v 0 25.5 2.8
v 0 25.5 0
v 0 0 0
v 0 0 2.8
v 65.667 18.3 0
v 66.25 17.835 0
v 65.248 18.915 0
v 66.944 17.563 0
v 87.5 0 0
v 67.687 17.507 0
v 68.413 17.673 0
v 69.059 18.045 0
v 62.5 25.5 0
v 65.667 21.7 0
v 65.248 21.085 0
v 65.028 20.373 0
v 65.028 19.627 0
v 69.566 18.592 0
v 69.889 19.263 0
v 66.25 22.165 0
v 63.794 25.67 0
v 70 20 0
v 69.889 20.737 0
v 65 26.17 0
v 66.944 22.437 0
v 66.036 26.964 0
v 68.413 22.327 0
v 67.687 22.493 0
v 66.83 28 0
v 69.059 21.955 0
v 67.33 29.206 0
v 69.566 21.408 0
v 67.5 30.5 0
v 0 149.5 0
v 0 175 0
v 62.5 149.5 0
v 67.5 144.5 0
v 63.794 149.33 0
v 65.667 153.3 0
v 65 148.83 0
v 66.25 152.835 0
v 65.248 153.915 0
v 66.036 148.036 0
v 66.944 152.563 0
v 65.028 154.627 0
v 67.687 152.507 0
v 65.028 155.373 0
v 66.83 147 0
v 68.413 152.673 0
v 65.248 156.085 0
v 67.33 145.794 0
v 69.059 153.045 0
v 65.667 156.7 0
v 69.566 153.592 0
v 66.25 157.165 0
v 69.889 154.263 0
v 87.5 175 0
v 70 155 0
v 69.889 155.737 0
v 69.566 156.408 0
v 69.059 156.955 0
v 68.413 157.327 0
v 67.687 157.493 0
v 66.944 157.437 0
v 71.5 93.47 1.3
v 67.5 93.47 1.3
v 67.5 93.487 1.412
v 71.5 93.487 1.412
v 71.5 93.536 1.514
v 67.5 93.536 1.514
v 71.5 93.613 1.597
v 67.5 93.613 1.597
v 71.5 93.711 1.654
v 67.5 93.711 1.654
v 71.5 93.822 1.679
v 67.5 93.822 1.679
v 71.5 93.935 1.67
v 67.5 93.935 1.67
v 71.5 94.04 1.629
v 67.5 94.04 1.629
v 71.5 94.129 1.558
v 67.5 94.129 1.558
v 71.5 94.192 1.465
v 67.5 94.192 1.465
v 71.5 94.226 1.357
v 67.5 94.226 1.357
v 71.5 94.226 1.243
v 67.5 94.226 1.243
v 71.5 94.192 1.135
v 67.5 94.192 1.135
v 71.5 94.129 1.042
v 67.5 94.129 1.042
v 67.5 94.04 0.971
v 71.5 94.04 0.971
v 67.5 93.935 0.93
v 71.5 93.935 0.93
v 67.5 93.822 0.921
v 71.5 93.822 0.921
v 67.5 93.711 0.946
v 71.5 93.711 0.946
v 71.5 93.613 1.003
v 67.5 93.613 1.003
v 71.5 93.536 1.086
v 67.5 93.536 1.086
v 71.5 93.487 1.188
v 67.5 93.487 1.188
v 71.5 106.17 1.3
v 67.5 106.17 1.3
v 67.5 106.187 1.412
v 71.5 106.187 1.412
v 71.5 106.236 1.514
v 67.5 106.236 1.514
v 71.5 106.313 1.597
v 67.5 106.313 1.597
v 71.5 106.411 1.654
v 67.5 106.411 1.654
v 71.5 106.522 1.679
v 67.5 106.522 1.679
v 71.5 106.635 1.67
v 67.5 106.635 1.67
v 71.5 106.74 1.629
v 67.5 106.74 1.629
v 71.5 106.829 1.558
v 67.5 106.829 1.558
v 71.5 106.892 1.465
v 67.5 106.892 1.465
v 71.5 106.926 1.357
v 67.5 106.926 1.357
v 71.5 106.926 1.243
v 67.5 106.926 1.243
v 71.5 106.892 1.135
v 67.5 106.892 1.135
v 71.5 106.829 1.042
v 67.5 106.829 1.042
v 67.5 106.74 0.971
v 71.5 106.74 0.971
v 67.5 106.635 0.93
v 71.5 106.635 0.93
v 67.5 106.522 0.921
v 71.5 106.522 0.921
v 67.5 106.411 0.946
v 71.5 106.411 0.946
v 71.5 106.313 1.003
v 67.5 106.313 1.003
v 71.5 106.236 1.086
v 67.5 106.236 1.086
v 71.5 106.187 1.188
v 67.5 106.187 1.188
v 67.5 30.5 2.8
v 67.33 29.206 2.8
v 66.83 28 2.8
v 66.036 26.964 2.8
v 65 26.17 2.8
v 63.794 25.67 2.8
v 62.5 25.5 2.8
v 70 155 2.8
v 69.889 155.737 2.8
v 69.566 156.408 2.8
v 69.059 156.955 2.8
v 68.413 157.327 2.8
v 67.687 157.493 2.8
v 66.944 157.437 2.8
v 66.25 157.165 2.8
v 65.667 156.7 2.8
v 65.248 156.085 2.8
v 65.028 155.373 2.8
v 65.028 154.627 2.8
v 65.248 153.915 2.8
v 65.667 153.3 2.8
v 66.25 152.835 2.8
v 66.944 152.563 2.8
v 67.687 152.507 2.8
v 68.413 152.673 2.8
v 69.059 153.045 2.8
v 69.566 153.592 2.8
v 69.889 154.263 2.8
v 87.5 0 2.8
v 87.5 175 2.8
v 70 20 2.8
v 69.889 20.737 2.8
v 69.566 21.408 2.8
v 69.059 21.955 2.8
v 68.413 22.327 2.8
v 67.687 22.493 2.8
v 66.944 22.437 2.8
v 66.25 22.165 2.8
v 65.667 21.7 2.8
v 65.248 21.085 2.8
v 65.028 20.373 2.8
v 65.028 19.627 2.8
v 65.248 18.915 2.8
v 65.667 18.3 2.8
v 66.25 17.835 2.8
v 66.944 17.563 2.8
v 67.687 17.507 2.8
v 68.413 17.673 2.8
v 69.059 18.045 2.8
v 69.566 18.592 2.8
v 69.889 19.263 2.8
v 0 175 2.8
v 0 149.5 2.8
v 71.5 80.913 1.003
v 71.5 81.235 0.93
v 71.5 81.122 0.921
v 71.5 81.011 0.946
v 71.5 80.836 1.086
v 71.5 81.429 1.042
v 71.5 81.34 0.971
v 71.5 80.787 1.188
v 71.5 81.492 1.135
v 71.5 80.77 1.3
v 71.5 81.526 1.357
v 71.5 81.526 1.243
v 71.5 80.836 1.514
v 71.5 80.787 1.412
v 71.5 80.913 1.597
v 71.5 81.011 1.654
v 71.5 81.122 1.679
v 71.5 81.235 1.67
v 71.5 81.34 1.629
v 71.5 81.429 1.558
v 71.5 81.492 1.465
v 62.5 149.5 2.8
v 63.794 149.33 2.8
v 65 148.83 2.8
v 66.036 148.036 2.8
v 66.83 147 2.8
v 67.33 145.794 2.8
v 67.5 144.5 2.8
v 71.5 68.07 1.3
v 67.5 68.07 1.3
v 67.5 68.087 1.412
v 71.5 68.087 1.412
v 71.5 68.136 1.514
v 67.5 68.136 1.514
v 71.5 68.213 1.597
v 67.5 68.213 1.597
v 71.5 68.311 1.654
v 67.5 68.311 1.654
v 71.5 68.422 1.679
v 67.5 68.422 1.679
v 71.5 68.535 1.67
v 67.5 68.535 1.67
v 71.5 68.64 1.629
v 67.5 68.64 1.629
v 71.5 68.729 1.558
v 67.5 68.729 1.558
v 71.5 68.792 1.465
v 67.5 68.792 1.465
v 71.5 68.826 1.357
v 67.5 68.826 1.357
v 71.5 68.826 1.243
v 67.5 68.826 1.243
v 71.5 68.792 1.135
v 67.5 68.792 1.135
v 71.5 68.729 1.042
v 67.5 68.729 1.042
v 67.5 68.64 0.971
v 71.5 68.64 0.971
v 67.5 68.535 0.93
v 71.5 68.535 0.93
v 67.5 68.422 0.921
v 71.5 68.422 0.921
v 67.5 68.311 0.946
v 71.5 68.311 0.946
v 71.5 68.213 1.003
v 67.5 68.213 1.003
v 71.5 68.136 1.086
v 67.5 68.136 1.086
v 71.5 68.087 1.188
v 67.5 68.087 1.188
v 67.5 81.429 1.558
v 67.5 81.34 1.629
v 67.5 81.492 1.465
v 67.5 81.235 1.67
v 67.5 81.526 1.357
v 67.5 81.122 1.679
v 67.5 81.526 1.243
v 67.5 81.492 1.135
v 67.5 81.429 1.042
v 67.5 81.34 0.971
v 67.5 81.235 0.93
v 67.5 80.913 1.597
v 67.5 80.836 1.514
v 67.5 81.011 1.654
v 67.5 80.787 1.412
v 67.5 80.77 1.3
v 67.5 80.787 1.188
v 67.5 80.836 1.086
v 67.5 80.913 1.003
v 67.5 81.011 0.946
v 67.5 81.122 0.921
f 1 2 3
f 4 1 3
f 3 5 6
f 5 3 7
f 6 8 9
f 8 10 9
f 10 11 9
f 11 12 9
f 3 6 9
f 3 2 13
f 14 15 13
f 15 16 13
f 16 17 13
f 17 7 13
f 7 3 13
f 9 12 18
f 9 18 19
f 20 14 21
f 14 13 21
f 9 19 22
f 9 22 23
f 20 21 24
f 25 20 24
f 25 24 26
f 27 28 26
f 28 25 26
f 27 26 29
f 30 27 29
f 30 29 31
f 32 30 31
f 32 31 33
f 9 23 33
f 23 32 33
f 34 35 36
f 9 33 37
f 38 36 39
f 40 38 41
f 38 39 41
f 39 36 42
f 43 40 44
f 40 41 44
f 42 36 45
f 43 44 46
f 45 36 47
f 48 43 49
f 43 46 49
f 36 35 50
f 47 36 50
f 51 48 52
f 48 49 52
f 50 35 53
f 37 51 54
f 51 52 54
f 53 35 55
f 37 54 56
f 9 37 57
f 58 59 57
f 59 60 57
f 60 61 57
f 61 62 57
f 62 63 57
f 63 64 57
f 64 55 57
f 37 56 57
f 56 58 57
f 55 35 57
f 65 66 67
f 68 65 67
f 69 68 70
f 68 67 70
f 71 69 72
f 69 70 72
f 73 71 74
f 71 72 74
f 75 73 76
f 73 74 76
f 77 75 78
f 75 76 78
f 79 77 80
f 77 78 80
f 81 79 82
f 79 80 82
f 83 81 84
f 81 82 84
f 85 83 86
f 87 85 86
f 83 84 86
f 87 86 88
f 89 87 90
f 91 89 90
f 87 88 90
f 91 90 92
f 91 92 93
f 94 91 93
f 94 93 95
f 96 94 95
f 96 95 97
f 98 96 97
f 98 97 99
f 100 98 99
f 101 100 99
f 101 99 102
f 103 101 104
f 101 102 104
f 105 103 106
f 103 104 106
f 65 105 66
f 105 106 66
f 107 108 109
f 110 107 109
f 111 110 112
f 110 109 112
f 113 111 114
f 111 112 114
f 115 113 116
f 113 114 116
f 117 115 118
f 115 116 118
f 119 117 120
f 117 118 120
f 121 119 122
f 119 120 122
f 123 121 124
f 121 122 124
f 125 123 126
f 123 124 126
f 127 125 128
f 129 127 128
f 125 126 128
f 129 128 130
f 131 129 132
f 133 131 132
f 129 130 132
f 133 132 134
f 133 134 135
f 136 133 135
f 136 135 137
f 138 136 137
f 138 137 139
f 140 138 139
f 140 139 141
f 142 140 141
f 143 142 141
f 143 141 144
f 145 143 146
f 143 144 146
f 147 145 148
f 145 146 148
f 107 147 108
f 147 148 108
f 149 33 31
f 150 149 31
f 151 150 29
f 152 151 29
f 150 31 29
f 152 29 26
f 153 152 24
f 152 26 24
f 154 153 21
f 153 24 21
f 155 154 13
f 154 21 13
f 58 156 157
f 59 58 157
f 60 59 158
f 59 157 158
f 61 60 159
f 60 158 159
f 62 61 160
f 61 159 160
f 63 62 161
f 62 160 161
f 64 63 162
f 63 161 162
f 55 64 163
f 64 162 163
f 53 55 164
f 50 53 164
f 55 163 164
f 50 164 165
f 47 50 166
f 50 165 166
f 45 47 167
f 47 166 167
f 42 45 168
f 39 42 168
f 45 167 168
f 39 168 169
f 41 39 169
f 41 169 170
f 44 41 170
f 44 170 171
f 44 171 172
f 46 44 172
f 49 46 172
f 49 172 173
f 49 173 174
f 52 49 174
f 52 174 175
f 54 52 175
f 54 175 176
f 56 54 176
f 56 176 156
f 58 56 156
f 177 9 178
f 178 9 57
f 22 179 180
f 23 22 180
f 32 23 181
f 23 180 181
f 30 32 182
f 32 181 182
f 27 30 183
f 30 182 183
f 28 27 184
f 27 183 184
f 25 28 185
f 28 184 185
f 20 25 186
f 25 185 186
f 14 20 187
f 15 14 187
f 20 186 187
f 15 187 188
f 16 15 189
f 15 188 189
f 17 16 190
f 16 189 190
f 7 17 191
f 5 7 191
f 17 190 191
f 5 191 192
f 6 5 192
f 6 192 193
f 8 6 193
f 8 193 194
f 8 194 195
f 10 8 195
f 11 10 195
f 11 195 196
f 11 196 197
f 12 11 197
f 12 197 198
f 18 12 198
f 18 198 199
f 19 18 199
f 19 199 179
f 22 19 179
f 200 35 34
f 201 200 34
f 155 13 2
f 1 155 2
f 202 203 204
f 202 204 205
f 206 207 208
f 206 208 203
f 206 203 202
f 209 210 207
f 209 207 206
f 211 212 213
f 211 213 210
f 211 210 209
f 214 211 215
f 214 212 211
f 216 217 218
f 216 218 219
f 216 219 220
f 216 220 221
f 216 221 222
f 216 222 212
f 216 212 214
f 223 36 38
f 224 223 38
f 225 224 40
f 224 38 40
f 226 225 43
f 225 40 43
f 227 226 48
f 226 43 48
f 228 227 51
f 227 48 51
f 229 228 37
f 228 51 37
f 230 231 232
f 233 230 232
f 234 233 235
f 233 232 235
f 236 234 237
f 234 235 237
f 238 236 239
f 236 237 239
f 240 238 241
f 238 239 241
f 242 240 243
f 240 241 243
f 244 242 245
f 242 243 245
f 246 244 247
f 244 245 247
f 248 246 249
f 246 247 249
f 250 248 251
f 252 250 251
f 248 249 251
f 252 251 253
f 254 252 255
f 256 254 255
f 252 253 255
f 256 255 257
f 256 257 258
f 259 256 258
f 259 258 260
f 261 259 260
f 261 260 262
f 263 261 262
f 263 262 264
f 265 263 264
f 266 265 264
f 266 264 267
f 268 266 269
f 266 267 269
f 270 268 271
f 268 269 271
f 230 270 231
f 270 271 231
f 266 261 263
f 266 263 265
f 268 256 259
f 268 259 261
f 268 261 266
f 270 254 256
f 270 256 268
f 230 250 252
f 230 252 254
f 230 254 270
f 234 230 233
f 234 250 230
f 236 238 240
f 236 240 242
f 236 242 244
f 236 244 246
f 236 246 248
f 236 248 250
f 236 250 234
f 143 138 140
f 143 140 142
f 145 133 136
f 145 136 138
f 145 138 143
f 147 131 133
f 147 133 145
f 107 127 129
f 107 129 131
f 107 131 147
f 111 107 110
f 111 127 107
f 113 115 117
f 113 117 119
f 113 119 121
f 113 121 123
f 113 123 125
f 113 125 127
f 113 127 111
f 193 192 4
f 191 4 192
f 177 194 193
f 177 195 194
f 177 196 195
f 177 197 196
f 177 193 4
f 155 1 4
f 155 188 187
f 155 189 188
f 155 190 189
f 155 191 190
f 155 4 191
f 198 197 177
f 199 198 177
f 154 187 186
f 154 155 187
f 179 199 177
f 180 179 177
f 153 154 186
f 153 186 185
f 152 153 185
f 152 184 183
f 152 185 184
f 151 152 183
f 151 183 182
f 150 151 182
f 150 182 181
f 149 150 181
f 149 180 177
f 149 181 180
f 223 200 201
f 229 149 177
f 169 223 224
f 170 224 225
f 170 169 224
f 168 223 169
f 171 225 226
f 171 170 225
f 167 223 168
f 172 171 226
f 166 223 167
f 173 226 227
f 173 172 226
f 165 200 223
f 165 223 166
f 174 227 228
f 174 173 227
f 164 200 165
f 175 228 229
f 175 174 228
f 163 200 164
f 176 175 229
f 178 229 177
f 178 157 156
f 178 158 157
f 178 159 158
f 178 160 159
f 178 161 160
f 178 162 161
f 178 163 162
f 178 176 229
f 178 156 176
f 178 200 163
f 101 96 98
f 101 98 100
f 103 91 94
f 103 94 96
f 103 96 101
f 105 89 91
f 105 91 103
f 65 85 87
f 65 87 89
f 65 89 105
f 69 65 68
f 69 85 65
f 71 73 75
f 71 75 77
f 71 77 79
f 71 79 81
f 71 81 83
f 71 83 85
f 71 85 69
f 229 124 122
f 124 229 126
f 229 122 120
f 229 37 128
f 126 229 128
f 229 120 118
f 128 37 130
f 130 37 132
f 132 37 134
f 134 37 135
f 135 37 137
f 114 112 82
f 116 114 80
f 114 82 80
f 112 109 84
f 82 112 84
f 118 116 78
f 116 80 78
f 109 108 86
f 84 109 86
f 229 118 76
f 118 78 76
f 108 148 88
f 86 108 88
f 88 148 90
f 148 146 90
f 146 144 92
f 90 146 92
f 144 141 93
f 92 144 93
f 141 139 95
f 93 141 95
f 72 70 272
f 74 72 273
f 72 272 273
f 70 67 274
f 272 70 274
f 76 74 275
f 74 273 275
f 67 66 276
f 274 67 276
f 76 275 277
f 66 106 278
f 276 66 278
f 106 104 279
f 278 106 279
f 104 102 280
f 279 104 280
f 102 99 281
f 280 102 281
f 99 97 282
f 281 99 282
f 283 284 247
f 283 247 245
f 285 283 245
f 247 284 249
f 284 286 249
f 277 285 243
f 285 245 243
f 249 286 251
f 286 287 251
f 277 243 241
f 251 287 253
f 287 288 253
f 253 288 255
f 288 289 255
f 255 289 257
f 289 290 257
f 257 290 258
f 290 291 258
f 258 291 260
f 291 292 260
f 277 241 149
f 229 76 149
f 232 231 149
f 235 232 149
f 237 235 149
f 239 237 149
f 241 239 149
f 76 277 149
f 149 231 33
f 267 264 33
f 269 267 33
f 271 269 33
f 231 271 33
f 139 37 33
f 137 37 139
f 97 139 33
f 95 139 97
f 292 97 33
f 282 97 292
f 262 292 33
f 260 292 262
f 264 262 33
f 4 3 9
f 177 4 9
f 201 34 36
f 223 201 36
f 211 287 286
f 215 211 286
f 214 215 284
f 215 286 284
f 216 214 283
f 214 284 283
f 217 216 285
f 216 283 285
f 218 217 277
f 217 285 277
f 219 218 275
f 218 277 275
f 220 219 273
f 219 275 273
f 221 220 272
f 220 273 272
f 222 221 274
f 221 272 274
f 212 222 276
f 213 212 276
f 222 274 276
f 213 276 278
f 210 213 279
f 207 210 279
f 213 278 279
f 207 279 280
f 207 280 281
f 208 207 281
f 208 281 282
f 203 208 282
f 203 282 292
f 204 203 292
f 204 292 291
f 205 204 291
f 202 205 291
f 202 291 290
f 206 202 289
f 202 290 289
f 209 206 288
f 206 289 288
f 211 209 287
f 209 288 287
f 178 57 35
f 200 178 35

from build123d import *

# Parameters (mm, degrees)
F1_DEPTH = 2.8
F2_R     = 0.38
F3_DEPTH = 4
F4_R     = 2.5
F5_DEPTH = 2.801


with BuildPart() as f1:
    # F0 (on Top) → F1 (new body)
    with BuildSketch(Plane.XY):
        with BuildLine():
            Line((0, 25.5), (0, 0))
            Line((0, 0), (87.5, 0))
            Line((87.5, 0), (87.5, 175))
            Line((87.5, 175), (0, 175))
            Line((0, 175), (0, 149.5))
            Line((0, 149.5), (62.5, 149.5))
            ThreePointArc((62.5, 149.5), (66.035534, 148.035534), (67.5, 144.5))
            Line((67.5, 144.5), (67.5, 30.5))
            ThreePointArc((67.5, 30.5), (66.035534, 26.964466), (62.5, 25.5))
            Line((62.5, 25.5), (0, 25.5))
        make_face()
    extrude(amount=F1_DEPTH)

    # F2 (on face) → F3 (cut)
    with BuildSketch(Plane(origin=(67.5, 0, 0), x_dir=(0, -1, 0), z_dir=(-1, 0, 0))):
        with Locations((-106.55, 1.3)):
            Circle(F2_R)
        with Locations((-93.85, 1.3)):
            Circle(F2_R)
        with Locations((-81.15, 1.3)):
            Circle(F2_R)
        with Locations((-68.45, 1.3)):
            Circle(F2_R)
    extrude(amount=-F3_DEPTH, mode=Mode.SUBTRACT)

    # F4 (on face) → F5 (cut, through all)
    with BuildSketch(Plane.XY.offset(2.8)):
        with Locations((67.5, 155)):
            Circle(F4_R)
        with Locations((67.5, 20)):
            Circle(F4_R)
    extrude(amount=-F5_DEPTH, mode=Mode.SUBTRACT)


solid = f1.part
